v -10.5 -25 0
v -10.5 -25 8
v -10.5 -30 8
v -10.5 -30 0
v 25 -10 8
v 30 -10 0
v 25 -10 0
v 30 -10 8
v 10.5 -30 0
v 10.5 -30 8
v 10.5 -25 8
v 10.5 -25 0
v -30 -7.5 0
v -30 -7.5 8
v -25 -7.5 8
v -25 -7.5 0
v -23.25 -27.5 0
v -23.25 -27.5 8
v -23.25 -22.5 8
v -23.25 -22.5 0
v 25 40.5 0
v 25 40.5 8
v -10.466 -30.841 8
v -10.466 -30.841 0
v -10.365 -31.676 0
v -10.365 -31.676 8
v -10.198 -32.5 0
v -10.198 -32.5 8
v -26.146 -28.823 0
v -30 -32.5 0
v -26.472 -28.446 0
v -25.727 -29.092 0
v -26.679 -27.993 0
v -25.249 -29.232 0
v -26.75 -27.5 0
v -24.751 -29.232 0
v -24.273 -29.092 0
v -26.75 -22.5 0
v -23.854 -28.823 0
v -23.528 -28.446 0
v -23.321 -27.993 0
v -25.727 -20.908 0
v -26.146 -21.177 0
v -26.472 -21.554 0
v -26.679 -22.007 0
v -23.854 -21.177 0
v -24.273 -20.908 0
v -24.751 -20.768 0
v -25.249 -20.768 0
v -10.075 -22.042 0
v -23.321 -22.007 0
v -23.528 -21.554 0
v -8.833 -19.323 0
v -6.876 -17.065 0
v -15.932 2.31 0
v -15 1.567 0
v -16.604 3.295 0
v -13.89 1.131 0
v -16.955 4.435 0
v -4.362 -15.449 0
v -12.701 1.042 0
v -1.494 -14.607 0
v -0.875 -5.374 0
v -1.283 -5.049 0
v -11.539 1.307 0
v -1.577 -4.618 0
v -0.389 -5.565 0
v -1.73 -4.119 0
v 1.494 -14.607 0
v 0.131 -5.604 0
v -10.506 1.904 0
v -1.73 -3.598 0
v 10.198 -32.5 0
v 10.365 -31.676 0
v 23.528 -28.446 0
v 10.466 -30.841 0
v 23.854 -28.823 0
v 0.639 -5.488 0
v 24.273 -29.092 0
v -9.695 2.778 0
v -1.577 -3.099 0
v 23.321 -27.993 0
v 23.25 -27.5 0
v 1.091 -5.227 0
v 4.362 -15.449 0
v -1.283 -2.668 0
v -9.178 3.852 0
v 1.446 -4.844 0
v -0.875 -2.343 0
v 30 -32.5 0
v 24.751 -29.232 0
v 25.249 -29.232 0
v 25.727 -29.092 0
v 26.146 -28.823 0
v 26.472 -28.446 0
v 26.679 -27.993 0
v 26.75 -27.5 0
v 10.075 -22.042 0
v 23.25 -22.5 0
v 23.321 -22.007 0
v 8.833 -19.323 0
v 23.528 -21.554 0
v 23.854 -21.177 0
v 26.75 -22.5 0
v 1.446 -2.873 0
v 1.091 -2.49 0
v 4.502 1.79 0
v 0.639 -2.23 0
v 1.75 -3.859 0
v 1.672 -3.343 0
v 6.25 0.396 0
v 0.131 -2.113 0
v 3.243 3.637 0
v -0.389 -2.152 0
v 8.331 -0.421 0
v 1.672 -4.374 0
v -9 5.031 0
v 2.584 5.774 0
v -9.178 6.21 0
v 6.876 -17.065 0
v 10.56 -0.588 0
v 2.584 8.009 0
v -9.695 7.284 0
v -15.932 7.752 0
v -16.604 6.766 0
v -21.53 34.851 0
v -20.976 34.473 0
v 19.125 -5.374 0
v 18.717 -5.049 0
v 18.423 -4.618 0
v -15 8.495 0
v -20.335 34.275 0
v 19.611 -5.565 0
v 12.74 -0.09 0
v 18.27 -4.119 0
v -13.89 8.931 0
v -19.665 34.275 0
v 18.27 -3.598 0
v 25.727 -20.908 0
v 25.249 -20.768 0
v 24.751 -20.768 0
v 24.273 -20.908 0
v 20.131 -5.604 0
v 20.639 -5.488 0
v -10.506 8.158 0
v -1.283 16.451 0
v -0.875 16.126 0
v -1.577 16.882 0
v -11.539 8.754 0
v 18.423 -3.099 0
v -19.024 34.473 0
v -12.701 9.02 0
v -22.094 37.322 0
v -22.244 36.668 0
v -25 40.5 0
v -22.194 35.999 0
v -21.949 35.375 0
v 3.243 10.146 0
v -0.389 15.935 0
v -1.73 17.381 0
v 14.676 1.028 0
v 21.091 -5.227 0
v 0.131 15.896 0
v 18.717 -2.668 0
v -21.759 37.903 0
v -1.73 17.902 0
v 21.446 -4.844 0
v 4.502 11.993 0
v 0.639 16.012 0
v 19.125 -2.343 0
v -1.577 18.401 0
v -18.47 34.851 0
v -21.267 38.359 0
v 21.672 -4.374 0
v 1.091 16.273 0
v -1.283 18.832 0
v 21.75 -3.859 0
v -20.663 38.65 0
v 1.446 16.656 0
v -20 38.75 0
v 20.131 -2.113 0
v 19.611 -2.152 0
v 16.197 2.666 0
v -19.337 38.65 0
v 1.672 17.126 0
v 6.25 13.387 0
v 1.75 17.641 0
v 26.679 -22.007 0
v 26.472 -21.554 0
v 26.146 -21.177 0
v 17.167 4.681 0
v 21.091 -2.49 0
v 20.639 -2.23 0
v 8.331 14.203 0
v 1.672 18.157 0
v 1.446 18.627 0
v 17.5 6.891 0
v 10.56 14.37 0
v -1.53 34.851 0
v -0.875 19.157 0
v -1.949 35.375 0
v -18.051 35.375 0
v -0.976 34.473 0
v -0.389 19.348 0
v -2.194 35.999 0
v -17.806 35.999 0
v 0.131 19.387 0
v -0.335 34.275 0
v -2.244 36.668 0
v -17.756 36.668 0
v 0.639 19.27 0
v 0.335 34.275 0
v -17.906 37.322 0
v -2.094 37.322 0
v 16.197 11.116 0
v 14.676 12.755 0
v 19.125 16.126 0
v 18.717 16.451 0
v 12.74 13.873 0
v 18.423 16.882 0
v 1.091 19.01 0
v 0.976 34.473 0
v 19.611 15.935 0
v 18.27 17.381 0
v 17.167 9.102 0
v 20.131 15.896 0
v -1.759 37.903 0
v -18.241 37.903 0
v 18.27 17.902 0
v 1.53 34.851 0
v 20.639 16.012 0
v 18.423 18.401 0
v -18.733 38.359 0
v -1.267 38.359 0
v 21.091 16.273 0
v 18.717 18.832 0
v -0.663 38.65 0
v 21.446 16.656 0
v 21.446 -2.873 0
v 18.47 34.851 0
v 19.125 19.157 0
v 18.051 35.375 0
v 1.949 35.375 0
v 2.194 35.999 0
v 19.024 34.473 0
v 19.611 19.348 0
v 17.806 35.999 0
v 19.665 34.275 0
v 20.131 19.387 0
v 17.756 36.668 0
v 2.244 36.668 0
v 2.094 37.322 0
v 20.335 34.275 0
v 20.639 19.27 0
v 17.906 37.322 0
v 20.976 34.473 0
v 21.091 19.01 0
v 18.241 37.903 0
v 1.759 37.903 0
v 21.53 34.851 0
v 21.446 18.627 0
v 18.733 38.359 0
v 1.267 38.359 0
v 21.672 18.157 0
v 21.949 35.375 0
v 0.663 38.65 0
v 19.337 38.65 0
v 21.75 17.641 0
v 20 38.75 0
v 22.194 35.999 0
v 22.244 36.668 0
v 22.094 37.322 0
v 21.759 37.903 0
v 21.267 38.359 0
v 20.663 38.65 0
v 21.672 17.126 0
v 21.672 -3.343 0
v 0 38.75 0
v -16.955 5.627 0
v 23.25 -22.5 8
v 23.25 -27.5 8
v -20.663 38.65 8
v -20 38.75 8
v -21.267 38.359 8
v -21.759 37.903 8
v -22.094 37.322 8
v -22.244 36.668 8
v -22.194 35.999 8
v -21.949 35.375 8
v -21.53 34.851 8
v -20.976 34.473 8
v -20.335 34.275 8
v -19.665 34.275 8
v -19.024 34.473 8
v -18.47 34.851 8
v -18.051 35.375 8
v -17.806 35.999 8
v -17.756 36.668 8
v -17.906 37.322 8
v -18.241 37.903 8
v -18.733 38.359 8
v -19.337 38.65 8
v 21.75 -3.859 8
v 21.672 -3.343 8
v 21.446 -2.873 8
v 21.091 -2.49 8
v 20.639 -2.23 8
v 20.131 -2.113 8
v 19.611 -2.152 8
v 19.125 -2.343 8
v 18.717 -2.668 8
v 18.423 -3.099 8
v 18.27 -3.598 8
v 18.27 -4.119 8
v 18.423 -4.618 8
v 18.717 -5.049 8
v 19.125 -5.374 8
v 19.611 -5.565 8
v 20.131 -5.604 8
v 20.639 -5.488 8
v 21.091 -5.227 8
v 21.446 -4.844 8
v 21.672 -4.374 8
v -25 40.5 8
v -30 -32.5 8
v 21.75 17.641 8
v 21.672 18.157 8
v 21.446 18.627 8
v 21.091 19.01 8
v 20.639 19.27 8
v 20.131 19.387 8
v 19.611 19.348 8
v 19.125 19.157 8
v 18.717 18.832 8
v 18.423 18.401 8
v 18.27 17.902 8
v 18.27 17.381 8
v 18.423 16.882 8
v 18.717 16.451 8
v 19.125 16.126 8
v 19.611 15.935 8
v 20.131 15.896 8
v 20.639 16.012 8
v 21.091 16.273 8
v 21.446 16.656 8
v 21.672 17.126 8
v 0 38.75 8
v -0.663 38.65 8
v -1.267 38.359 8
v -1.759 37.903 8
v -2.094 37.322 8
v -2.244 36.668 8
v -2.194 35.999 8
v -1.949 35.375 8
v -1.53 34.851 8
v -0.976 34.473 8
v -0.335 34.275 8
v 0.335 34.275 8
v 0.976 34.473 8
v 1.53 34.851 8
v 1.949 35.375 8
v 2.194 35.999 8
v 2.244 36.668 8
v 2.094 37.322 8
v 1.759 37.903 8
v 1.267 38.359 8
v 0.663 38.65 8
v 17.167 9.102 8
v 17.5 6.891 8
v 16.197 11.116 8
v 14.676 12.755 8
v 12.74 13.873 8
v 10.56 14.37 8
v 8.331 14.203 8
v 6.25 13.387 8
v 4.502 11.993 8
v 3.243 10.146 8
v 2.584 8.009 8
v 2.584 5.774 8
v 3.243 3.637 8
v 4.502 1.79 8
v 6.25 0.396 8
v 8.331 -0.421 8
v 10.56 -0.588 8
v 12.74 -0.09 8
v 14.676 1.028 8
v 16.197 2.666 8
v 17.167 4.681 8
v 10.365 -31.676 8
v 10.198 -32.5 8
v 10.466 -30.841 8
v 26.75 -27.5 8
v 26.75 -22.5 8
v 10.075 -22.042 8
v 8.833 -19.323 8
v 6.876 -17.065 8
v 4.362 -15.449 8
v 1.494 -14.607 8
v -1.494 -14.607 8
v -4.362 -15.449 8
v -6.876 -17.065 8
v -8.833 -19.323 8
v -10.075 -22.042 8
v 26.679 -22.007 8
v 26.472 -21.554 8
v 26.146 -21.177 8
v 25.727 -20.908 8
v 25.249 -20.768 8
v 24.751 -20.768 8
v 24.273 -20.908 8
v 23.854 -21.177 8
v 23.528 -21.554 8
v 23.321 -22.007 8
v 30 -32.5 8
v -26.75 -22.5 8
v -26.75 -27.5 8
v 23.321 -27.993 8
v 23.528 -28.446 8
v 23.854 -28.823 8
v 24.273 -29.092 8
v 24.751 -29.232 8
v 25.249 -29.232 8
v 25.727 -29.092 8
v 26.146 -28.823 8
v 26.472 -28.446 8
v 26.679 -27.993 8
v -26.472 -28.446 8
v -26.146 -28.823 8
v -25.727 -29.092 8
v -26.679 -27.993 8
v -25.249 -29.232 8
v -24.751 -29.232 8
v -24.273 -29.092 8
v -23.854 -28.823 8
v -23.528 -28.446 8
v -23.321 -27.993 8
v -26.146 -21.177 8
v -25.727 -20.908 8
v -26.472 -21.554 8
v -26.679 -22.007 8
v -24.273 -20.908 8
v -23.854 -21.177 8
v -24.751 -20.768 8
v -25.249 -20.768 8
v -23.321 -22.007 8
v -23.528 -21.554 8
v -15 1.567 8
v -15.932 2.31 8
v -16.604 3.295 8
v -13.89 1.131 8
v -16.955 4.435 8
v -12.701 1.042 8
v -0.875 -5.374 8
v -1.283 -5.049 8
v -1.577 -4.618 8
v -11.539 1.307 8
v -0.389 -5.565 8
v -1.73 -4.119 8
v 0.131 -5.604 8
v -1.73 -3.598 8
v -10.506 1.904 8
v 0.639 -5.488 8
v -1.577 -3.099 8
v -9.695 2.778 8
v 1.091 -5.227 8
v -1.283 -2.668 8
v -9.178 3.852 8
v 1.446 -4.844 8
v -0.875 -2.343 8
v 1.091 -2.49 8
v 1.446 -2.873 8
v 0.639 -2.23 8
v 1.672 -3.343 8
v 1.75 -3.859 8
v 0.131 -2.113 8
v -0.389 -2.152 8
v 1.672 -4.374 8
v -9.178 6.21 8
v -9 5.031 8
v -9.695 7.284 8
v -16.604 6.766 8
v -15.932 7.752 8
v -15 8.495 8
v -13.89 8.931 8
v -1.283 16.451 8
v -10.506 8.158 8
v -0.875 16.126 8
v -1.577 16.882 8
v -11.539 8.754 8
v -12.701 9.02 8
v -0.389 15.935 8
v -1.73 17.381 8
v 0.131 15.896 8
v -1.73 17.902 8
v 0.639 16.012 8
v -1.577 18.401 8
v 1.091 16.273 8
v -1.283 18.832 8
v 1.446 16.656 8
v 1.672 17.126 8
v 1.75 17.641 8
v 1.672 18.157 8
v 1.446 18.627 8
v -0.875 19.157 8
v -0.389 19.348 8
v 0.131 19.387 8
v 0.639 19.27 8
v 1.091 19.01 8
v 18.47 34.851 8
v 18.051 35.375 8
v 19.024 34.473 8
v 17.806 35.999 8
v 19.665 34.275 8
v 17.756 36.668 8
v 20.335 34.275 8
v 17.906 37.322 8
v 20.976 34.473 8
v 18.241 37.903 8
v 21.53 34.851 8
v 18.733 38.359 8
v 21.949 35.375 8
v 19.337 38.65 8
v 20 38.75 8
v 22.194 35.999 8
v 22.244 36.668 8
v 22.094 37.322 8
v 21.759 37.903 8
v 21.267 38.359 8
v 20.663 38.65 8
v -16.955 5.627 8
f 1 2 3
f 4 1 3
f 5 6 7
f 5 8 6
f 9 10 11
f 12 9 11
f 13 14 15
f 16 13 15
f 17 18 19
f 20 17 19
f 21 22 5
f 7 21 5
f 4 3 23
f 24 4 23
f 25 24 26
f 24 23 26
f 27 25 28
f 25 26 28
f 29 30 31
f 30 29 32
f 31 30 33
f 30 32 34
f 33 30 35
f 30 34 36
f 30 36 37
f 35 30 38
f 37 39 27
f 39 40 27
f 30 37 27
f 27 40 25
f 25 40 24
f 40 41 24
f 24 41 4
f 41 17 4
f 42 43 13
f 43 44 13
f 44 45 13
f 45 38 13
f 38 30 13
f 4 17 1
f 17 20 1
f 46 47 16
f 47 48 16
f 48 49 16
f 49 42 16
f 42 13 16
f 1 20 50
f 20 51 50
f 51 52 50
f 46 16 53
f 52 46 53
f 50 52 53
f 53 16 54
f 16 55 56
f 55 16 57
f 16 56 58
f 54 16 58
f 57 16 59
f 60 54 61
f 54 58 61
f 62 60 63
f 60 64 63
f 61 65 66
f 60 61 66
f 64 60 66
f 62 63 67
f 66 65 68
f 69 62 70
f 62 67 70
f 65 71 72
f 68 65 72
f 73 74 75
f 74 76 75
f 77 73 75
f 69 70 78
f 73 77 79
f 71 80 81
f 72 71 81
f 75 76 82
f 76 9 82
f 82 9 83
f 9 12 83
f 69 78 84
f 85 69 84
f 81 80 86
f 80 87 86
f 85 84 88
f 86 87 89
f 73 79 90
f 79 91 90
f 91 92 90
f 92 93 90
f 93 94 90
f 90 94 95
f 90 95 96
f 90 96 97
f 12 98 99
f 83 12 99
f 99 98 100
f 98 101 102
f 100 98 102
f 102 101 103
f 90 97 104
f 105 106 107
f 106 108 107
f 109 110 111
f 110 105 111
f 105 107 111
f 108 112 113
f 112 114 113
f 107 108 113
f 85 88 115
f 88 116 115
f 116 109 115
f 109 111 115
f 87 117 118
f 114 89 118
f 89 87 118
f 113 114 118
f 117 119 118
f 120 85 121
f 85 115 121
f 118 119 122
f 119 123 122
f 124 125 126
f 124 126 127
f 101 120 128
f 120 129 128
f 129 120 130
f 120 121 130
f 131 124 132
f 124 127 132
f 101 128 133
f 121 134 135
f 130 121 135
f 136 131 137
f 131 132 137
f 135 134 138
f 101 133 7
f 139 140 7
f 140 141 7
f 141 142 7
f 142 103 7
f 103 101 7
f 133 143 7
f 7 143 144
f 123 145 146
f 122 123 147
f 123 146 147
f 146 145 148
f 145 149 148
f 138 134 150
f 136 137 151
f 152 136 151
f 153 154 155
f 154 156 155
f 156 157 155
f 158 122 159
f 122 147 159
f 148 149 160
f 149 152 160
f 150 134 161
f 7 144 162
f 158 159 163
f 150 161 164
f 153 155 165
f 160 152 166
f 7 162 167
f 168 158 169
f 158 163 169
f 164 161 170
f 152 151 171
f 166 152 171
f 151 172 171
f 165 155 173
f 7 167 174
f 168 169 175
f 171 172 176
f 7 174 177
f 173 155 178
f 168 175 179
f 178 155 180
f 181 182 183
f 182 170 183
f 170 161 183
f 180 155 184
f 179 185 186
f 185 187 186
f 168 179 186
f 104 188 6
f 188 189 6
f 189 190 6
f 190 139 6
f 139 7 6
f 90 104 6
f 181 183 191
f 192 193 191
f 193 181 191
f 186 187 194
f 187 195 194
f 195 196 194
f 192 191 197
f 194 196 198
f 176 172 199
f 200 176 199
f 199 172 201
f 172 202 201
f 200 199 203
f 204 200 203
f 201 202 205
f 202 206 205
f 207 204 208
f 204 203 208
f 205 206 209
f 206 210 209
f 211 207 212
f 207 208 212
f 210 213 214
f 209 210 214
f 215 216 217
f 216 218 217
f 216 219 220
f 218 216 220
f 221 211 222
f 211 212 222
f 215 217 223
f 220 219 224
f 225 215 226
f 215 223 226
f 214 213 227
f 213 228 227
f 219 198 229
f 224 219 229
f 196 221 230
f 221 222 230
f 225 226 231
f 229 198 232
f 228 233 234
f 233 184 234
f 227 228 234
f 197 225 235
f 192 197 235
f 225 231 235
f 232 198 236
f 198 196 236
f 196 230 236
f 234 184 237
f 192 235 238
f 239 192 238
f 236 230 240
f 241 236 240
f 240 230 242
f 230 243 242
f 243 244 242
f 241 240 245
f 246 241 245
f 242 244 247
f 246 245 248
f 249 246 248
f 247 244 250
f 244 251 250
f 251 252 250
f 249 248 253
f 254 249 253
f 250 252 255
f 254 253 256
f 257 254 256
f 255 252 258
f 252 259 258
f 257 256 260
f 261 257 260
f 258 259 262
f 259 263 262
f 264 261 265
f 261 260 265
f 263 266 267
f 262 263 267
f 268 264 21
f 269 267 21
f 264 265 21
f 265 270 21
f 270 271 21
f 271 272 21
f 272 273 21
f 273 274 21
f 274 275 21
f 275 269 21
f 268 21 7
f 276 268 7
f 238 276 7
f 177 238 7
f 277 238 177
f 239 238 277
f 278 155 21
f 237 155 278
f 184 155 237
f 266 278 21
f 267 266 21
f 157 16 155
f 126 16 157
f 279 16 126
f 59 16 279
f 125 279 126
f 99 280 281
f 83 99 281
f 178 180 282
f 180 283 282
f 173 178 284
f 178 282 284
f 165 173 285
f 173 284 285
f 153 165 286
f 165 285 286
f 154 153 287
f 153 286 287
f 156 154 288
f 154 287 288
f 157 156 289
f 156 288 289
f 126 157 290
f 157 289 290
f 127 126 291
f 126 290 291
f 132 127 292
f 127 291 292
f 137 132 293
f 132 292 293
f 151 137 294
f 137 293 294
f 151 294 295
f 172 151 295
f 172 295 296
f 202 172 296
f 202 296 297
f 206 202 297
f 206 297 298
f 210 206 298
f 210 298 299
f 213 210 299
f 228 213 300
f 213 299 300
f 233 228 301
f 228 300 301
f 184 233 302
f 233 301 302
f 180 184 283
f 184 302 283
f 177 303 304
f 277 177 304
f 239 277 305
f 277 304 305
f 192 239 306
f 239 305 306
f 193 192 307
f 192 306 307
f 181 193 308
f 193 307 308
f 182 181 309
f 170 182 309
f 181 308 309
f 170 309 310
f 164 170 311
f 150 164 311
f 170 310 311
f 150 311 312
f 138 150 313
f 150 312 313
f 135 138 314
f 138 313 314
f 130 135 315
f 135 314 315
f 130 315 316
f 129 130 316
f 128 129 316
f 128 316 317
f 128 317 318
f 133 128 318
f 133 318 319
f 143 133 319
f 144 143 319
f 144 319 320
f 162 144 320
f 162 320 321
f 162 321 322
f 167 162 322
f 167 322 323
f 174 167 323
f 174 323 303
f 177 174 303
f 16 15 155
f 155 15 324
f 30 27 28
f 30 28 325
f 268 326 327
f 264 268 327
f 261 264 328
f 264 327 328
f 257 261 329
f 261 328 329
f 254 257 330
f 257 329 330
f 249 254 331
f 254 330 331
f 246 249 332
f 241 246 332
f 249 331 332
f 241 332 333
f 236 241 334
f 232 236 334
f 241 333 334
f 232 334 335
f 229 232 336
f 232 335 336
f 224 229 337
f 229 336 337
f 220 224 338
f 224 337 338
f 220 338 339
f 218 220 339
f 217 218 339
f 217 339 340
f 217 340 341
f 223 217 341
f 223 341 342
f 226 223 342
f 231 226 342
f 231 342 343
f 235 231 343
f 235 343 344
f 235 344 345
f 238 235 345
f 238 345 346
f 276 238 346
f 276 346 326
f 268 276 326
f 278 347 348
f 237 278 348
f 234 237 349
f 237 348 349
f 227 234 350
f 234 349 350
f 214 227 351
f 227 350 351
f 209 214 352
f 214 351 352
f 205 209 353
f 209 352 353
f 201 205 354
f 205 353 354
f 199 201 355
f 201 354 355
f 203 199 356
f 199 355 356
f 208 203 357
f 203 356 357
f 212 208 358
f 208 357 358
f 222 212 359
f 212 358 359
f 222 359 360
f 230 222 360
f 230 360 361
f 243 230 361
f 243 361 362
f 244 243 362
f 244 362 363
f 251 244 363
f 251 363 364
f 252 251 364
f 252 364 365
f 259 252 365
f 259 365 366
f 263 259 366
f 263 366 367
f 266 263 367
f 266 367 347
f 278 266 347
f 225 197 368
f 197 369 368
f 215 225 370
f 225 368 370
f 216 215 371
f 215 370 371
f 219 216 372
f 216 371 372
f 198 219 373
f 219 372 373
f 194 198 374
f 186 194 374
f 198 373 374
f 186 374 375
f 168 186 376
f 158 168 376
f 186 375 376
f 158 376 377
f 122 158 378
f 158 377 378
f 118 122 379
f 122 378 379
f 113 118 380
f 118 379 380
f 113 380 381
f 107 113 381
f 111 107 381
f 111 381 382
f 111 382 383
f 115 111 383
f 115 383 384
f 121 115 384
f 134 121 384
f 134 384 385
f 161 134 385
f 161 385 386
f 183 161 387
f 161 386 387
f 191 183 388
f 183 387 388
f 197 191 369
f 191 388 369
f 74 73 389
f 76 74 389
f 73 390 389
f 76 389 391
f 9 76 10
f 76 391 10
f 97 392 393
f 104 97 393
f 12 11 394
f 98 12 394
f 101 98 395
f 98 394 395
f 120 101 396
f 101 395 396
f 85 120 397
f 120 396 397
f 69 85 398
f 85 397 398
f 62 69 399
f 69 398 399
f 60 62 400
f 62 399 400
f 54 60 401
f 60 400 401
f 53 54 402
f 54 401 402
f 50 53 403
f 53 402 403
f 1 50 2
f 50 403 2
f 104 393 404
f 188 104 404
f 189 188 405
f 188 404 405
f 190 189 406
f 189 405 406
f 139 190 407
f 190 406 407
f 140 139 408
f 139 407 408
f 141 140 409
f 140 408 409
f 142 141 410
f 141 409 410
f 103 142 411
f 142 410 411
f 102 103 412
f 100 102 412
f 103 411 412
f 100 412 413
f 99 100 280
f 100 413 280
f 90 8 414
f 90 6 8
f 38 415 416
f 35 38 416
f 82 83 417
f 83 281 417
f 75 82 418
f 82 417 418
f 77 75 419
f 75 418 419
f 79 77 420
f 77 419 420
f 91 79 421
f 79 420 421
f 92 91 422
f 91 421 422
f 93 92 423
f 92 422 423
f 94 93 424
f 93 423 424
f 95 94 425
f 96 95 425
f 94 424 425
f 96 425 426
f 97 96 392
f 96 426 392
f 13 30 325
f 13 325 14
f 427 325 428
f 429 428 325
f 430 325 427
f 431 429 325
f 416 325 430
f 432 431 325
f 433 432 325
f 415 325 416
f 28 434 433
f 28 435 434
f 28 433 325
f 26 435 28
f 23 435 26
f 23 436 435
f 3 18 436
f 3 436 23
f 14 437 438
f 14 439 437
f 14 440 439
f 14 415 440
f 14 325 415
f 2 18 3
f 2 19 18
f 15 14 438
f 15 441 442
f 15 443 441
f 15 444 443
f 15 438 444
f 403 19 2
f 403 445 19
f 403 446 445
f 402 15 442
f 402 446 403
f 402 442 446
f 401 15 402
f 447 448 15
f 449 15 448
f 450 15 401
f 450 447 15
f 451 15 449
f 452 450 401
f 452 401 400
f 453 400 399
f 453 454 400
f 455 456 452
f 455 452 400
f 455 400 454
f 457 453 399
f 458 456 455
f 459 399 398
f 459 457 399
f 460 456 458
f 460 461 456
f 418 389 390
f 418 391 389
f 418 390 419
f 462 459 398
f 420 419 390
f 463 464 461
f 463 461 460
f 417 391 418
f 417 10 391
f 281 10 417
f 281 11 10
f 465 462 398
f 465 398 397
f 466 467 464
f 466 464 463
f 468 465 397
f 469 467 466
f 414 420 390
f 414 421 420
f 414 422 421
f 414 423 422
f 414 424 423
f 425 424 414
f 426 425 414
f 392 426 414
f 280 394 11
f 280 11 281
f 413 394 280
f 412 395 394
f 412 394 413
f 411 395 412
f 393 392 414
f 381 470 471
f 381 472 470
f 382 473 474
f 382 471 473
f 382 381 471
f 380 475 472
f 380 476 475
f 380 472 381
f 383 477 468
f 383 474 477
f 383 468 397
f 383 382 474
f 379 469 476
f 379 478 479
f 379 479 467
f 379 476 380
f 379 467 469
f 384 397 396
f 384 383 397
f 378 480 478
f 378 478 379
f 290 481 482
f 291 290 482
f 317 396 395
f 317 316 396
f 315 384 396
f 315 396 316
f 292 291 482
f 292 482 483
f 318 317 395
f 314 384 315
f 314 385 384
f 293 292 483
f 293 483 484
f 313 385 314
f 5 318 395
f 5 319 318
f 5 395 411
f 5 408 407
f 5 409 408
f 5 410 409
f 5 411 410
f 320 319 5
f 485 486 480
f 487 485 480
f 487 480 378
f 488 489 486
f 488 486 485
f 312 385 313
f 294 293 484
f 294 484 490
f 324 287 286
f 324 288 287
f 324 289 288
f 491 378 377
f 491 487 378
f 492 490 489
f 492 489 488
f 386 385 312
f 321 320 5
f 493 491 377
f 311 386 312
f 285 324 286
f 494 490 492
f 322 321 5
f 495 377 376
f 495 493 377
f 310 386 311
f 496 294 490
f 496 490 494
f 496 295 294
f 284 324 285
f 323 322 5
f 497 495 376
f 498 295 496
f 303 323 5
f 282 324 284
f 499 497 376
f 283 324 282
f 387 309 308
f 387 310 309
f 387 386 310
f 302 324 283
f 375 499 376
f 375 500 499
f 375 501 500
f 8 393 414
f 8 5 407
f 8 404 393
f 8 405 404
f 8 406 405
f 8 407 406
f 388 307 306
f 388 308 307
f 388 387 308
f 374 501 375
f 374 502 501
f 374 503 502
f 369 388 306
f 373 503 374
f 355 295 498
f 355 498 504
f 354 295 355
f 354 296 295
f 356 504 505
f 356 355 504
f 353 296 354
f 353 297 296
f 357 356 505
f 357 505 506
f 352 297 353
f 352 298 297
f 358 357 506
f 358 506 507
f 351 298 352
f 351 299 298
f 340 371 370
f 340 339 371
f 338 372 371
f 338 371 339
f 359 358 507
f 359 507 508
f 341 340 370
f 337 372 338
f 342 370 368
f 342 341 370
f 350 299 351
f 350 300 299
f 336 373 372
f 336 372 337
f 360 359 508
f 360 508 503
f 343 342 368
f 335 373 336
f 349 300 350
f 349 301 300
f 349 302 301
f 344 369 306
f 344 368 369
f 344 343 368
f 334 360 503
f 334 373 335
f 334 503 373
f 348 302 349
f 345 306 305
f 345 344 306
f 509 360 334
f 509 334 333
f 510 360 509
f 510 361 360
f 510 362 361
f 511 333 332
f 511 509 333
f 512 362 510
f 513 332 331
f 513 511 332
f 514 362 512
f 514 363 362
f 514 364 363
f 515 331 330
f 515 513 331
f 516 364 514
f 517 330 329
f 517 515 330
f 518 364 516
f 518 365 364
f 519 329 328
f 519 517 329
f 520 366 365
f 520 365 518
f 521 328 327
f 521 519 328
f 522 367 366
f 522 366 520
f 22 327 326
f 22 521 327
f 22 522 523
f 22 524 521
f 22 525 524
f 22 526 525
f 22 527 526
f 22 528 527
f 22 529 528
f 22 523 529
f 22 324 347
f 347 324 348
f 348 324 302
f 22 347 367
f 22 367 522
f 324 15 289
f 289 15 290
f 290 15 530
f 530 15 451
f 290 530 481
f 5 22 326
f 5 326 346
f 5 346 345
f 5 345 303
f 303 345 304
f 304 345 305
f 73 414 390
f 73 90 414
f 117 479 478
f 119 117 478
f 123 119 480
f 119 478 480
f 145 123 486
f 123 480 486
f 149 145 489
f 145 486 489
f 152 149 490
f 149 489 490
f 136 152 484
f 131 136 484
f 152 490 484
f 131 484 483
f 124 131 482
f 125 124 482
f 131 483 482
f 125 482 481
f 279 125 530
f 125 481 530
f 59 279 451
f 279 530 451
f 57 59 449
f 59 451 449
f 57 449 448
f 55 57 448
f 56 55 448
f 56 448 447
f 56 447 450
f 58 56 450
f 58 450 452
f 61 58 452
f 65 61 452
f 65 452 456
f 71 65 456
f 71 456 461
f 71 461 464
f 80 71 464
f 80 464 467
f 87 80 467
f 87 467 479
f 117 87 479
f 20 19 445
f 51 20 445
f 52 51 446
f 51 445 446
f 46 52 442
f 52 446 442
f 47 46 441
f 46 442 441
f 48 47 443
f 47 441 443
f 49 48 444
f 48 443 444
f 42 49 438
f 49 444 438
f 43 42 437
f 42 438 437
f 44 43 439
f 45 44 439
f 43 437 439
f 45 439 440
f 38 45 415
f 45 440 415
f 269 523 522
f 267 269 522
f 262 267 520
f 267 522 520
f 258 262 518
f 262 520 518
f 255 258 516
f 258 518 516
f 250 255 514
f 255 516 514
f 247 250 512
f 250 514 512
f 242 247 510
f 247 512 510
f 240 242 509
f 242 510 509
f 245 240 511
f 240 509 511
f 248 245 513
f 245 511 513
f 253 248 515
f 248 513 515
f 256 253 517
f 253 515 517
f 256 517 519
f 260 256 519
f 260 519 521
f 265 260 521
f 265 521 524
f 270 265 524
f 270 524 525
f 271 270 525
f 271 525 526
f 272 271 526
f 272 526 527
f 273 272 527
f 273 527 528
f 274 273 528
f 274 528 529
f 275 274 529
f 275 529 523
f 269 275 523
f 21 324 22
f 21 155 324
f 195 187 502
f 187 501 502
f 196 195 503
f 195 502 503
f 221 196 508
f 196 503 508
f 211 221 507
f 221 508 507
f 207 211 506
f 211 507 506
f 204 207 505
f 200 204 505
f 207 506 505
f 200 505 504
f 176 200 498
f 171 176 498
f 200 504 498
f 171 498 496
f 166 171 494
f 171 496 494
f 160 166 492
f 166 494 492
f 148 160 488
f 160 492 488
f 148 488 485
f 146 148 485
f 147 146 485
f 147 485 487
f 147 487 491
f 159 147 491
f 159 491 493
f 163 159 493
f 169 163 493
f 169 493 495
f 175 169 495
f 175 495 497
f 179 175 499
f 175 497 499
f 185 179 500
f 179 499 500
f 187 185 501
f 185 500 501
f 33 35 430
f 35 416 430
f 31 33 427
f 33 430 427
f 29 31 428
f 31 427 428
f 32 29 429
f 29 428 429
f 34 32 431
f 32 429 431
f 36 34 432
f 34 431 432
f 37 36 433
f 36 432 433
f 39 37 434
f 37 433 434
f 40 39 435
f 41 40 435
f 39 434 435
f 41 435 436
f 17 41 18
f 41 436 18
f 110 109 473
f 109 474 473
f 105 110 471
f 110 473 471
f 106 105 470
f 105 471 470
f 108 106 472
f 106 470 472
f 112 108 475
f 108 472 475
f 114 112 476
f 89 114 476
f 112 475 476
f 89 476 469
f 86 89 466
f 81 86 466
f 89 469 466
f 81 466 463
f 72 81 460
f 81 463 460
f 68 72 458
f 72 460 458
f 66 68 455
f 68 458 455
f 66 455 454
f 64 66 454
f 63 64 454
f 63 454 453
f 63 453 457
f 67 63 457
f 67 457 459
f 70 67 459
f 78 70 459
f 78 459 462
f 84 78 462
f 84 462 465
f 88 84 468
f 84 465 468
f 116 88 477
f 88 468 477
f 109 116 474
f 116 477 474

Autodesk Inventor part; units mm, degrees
ref_plane "YZ Plane" through (0, 0, 0) normal (1, 0, 0) x (0, 1, 0)
ref_plane "XZ Plane" through (0, 0, 0) normal (0, 1, 0) x (-1, 0, 0)
ref_plane "XY Plane" through (0, 0, 0) normal (0, 0, 1) x (1, 0, 0)
sketch "Sketch1" plane through (0, 0, 0) normal (0, 0, 1) x (1, 0, 0)
  line L0 (-30, 32.5) -> (30, 32.5)
  line L1 (30, 32.5) -> (30, -32.5)
  line L2 (30, -32.5) -> (-30, -32.5)
  line L3 (-30, -32.5) -> (-30, 32.5)
  point P0 (0, 0)
  point P1 (0, 32.5)
  point P2 (-30, 0)
  dimension "d0" = 60
  dimension "d1" = 65
extrude "Extrusion1" add sketch "Sketch1" along normal blind 8
sketch "Sketch4" plane through (0, 0, 8) normal (0, 0, 1) x (1, 0, 0)
  circle A0 centre (-25, -15) radius 1.75
  circle A1 centre (25, -15) radius 1.75
  circle A2 centre (25, -25) radius 1.75
  arc A3 (-10.5, -30) -> (10.5, -30) centre (0, -30) ccw
  line L0 (10.5, -30) -> (10.5, -25)
  arc A4 (10.5, -25) -> (-10.5, -25) centre (0, -25) ccw
  line L1 (-10.5, -25) -> (-10.5, -30)
  line L2 (30, -10) -> (30, -50)
  line L3 (30, -50) -> (-30, -50)
  line L4 (-30, -50) -> (-30, -10)
  line L5 (-30, -10) -> (30, -10)
  line L6 (25, -27.5) -> (25, -22.5) construction
  line L7 (26.75, -27.5) -> (26.75, -22.5)
  line L8 (23.25, -22.5) -> (23.25, -27.5)
  arc A5 (23.25, -27.5) -> (26.75, -27.5) centre (25, -27.5) ccw
  arc A6 (26.75, -22.5) -> (23.25, -22.5) centre (25, -22.5) ccw
  line L9 (-25, -27.5) -> (-25, -22.5) construction
  line L10 (-23.25, -27.5) -> (-23.25, -22.5)
  line L11 (-26.75, -22.5) -> (-26.75, -27.5)
  arc A7 (-26.75, -27.5) -> (-23.25, -27.5) centre (-25, -27.5) ccw
  arc A8 (-23.25, -22.5) -> (-26.75, -22.5) centre (-25, -22.5) ccw
  line L12 (-30, -32.5) -> (30, -32.5) projected
  point P0 (0, 0)
  point P1 (-25, -25)
  point P2 (26.75, -25)
  point P3 (23.25, -25)
  dimension "d22" = 5
  dimension "d23" = 3.5
  dimension "d24" = 5
  dimension "d25" = 10.5
  dimension "d26" = 7.5
  dimension "d27" = 30
extrude "Extrusion4" cut sketch "Sketch4" against normal blind 10 contours A2 | L7 A5 L8 A2 | A2 L8 A6 L7 | L1 A4 L0 A3 L12 | L12 A3 | A7 L11 A8 L10
sketch "Sketch5" plane through (0, 0, 8) normal (0, 0, 1) x (1, 0, 0)
  circle A0 centre (10, 6.8914) radius 7.5
  line L0 (30, 32.5) -> (-30, 32.5) projected
  line L1 (30, -32.5) -> (30, 32.5) projected
  point P0 (0, 0)
  dimension "d13" = 15
  dimension "d28" = 25.6086
  dimension "d29" = 20
extrude "Extrusion5" cut sketch "Sketch5" against normal through all
sketch "Sketch6" plane through (0, 0, 8) normal (0, 0, 1) x (1, 0, 0)
  circle A0 centre (20, 17.6414) radius 1.75
  circle A1 centre (0, 17.6414) radius 1.75
  circle A2 centre (0, -3.8586) radius 1.75
  circle A3 centre (20, -3.8586) radius 1.75
  line L0 (0, 17.6414) -> (20, 17.6414) construction
  line L1 (20, 17.6414) -> (20, -3.8586) construction
  line L2 (20, -3.8586) -> (0, -3.8586) construction
  line L3 (0, -3.8586) -> (0, 17.6414) construction
  line L4 (30, -32.5) -> (30, 32.5) construction
  line L5 (30, 32.5) -> (-30, 32.5) construction
  circle A4 centre (10, 6.8914) radius 7.5 projected
  point P0 (0, 0)
  point P1 (10, -3.8586)
  point P2 (20, 6.8914)
  dimension "d31" = 21.5
  dimension "d33" = 3.5
  dimension "d42" = 20
extrude "Extrusion6" cut sketch "Sketch6" against normal through all contours A0 | A1 | A2 | A3
sketch "Sketch7" plane through (0, 0, 8) normal (0, 0, 1) x (1, 0, 0)
  line L0 (-30, 32.5) -> (-30, -32.5) projected
  line L1 (-30, -7.5) -> (-25, -7.5)
  line L2 (-25, -7.5) -> (-25, 32.5)
  line L3 (-25, 32.5) -> (-30, 32.5)
  line L4 (-30, 32.5) -> (-30, -7.5)
  line L5 (30, 32.5) -> (-30, 32.5) projected
  line L6 (30, -10) -> (-30, -10) projected
  line L7 (25, -10) -> (30, -10)
  line L8 (30, -10) -> (30, 32.5)
  line L9 (30, 32.5) -> (25, 32.5)
  line L10 (25, 32.5) -> (25, -10)
  line L11 (30, -32.5) -> (30, 32.5) projected
  point P0 (0, 0)
  point P1 (25, -10)
  dimension "d18" = 5
  dimension "d19" = 5
  dimension "d43" = 40
extrude "Extrusion7" cut sketch "Sketch7" against normal through all contours L3 L2 L1 L0 | L5 L8 L6 L10
sketch "Sketch8" plane through (0, 0, 8) normal (0, 0, 1) x (1, 0, 0)
  circle A0 centre (-13, 5.0309) radius 4
  line L0 (-30, -7.5) -> (-30, -32.5) projected
  line L1 (25, 32.5) -> (-25, 32.5) projected
  point P0 (0, 0)
  dimension "d35" = 8
  dimension "d36" = 17
  dimension "d37" = 27.4691
extrude "Extrusion8" cut sketch "Sketch8" against normal blind 10
move faces "Move1" translate (0, 8, 0) faces at (8.3333, 32.5, 2.6667)
sketch "Sketch9" plane through (0, 0, 0) normal (0, 0, -1) x (-1, 0, 0)
  line L0 (-25, 40.5) -> (25, 40.5) projected
  point P0 (0, 0)
  point P1 (0, 36.5)
  point P2 (-20, 36.5)
  point P3 (20, 36.5)
  dimension "d47" = 20
  dimension "d48" = 20
  dimension "d49" = 4
hole "Hole1" at (0, 36.5, 0) at (20, 36.5, 0) at (-20, 36.5, 0) direction (0, 0, 1) diameter 4.5 end through all
equation "\"d19\" = d18"
equation "\"d48\" = d47"
properties part number "0005-10-005"
